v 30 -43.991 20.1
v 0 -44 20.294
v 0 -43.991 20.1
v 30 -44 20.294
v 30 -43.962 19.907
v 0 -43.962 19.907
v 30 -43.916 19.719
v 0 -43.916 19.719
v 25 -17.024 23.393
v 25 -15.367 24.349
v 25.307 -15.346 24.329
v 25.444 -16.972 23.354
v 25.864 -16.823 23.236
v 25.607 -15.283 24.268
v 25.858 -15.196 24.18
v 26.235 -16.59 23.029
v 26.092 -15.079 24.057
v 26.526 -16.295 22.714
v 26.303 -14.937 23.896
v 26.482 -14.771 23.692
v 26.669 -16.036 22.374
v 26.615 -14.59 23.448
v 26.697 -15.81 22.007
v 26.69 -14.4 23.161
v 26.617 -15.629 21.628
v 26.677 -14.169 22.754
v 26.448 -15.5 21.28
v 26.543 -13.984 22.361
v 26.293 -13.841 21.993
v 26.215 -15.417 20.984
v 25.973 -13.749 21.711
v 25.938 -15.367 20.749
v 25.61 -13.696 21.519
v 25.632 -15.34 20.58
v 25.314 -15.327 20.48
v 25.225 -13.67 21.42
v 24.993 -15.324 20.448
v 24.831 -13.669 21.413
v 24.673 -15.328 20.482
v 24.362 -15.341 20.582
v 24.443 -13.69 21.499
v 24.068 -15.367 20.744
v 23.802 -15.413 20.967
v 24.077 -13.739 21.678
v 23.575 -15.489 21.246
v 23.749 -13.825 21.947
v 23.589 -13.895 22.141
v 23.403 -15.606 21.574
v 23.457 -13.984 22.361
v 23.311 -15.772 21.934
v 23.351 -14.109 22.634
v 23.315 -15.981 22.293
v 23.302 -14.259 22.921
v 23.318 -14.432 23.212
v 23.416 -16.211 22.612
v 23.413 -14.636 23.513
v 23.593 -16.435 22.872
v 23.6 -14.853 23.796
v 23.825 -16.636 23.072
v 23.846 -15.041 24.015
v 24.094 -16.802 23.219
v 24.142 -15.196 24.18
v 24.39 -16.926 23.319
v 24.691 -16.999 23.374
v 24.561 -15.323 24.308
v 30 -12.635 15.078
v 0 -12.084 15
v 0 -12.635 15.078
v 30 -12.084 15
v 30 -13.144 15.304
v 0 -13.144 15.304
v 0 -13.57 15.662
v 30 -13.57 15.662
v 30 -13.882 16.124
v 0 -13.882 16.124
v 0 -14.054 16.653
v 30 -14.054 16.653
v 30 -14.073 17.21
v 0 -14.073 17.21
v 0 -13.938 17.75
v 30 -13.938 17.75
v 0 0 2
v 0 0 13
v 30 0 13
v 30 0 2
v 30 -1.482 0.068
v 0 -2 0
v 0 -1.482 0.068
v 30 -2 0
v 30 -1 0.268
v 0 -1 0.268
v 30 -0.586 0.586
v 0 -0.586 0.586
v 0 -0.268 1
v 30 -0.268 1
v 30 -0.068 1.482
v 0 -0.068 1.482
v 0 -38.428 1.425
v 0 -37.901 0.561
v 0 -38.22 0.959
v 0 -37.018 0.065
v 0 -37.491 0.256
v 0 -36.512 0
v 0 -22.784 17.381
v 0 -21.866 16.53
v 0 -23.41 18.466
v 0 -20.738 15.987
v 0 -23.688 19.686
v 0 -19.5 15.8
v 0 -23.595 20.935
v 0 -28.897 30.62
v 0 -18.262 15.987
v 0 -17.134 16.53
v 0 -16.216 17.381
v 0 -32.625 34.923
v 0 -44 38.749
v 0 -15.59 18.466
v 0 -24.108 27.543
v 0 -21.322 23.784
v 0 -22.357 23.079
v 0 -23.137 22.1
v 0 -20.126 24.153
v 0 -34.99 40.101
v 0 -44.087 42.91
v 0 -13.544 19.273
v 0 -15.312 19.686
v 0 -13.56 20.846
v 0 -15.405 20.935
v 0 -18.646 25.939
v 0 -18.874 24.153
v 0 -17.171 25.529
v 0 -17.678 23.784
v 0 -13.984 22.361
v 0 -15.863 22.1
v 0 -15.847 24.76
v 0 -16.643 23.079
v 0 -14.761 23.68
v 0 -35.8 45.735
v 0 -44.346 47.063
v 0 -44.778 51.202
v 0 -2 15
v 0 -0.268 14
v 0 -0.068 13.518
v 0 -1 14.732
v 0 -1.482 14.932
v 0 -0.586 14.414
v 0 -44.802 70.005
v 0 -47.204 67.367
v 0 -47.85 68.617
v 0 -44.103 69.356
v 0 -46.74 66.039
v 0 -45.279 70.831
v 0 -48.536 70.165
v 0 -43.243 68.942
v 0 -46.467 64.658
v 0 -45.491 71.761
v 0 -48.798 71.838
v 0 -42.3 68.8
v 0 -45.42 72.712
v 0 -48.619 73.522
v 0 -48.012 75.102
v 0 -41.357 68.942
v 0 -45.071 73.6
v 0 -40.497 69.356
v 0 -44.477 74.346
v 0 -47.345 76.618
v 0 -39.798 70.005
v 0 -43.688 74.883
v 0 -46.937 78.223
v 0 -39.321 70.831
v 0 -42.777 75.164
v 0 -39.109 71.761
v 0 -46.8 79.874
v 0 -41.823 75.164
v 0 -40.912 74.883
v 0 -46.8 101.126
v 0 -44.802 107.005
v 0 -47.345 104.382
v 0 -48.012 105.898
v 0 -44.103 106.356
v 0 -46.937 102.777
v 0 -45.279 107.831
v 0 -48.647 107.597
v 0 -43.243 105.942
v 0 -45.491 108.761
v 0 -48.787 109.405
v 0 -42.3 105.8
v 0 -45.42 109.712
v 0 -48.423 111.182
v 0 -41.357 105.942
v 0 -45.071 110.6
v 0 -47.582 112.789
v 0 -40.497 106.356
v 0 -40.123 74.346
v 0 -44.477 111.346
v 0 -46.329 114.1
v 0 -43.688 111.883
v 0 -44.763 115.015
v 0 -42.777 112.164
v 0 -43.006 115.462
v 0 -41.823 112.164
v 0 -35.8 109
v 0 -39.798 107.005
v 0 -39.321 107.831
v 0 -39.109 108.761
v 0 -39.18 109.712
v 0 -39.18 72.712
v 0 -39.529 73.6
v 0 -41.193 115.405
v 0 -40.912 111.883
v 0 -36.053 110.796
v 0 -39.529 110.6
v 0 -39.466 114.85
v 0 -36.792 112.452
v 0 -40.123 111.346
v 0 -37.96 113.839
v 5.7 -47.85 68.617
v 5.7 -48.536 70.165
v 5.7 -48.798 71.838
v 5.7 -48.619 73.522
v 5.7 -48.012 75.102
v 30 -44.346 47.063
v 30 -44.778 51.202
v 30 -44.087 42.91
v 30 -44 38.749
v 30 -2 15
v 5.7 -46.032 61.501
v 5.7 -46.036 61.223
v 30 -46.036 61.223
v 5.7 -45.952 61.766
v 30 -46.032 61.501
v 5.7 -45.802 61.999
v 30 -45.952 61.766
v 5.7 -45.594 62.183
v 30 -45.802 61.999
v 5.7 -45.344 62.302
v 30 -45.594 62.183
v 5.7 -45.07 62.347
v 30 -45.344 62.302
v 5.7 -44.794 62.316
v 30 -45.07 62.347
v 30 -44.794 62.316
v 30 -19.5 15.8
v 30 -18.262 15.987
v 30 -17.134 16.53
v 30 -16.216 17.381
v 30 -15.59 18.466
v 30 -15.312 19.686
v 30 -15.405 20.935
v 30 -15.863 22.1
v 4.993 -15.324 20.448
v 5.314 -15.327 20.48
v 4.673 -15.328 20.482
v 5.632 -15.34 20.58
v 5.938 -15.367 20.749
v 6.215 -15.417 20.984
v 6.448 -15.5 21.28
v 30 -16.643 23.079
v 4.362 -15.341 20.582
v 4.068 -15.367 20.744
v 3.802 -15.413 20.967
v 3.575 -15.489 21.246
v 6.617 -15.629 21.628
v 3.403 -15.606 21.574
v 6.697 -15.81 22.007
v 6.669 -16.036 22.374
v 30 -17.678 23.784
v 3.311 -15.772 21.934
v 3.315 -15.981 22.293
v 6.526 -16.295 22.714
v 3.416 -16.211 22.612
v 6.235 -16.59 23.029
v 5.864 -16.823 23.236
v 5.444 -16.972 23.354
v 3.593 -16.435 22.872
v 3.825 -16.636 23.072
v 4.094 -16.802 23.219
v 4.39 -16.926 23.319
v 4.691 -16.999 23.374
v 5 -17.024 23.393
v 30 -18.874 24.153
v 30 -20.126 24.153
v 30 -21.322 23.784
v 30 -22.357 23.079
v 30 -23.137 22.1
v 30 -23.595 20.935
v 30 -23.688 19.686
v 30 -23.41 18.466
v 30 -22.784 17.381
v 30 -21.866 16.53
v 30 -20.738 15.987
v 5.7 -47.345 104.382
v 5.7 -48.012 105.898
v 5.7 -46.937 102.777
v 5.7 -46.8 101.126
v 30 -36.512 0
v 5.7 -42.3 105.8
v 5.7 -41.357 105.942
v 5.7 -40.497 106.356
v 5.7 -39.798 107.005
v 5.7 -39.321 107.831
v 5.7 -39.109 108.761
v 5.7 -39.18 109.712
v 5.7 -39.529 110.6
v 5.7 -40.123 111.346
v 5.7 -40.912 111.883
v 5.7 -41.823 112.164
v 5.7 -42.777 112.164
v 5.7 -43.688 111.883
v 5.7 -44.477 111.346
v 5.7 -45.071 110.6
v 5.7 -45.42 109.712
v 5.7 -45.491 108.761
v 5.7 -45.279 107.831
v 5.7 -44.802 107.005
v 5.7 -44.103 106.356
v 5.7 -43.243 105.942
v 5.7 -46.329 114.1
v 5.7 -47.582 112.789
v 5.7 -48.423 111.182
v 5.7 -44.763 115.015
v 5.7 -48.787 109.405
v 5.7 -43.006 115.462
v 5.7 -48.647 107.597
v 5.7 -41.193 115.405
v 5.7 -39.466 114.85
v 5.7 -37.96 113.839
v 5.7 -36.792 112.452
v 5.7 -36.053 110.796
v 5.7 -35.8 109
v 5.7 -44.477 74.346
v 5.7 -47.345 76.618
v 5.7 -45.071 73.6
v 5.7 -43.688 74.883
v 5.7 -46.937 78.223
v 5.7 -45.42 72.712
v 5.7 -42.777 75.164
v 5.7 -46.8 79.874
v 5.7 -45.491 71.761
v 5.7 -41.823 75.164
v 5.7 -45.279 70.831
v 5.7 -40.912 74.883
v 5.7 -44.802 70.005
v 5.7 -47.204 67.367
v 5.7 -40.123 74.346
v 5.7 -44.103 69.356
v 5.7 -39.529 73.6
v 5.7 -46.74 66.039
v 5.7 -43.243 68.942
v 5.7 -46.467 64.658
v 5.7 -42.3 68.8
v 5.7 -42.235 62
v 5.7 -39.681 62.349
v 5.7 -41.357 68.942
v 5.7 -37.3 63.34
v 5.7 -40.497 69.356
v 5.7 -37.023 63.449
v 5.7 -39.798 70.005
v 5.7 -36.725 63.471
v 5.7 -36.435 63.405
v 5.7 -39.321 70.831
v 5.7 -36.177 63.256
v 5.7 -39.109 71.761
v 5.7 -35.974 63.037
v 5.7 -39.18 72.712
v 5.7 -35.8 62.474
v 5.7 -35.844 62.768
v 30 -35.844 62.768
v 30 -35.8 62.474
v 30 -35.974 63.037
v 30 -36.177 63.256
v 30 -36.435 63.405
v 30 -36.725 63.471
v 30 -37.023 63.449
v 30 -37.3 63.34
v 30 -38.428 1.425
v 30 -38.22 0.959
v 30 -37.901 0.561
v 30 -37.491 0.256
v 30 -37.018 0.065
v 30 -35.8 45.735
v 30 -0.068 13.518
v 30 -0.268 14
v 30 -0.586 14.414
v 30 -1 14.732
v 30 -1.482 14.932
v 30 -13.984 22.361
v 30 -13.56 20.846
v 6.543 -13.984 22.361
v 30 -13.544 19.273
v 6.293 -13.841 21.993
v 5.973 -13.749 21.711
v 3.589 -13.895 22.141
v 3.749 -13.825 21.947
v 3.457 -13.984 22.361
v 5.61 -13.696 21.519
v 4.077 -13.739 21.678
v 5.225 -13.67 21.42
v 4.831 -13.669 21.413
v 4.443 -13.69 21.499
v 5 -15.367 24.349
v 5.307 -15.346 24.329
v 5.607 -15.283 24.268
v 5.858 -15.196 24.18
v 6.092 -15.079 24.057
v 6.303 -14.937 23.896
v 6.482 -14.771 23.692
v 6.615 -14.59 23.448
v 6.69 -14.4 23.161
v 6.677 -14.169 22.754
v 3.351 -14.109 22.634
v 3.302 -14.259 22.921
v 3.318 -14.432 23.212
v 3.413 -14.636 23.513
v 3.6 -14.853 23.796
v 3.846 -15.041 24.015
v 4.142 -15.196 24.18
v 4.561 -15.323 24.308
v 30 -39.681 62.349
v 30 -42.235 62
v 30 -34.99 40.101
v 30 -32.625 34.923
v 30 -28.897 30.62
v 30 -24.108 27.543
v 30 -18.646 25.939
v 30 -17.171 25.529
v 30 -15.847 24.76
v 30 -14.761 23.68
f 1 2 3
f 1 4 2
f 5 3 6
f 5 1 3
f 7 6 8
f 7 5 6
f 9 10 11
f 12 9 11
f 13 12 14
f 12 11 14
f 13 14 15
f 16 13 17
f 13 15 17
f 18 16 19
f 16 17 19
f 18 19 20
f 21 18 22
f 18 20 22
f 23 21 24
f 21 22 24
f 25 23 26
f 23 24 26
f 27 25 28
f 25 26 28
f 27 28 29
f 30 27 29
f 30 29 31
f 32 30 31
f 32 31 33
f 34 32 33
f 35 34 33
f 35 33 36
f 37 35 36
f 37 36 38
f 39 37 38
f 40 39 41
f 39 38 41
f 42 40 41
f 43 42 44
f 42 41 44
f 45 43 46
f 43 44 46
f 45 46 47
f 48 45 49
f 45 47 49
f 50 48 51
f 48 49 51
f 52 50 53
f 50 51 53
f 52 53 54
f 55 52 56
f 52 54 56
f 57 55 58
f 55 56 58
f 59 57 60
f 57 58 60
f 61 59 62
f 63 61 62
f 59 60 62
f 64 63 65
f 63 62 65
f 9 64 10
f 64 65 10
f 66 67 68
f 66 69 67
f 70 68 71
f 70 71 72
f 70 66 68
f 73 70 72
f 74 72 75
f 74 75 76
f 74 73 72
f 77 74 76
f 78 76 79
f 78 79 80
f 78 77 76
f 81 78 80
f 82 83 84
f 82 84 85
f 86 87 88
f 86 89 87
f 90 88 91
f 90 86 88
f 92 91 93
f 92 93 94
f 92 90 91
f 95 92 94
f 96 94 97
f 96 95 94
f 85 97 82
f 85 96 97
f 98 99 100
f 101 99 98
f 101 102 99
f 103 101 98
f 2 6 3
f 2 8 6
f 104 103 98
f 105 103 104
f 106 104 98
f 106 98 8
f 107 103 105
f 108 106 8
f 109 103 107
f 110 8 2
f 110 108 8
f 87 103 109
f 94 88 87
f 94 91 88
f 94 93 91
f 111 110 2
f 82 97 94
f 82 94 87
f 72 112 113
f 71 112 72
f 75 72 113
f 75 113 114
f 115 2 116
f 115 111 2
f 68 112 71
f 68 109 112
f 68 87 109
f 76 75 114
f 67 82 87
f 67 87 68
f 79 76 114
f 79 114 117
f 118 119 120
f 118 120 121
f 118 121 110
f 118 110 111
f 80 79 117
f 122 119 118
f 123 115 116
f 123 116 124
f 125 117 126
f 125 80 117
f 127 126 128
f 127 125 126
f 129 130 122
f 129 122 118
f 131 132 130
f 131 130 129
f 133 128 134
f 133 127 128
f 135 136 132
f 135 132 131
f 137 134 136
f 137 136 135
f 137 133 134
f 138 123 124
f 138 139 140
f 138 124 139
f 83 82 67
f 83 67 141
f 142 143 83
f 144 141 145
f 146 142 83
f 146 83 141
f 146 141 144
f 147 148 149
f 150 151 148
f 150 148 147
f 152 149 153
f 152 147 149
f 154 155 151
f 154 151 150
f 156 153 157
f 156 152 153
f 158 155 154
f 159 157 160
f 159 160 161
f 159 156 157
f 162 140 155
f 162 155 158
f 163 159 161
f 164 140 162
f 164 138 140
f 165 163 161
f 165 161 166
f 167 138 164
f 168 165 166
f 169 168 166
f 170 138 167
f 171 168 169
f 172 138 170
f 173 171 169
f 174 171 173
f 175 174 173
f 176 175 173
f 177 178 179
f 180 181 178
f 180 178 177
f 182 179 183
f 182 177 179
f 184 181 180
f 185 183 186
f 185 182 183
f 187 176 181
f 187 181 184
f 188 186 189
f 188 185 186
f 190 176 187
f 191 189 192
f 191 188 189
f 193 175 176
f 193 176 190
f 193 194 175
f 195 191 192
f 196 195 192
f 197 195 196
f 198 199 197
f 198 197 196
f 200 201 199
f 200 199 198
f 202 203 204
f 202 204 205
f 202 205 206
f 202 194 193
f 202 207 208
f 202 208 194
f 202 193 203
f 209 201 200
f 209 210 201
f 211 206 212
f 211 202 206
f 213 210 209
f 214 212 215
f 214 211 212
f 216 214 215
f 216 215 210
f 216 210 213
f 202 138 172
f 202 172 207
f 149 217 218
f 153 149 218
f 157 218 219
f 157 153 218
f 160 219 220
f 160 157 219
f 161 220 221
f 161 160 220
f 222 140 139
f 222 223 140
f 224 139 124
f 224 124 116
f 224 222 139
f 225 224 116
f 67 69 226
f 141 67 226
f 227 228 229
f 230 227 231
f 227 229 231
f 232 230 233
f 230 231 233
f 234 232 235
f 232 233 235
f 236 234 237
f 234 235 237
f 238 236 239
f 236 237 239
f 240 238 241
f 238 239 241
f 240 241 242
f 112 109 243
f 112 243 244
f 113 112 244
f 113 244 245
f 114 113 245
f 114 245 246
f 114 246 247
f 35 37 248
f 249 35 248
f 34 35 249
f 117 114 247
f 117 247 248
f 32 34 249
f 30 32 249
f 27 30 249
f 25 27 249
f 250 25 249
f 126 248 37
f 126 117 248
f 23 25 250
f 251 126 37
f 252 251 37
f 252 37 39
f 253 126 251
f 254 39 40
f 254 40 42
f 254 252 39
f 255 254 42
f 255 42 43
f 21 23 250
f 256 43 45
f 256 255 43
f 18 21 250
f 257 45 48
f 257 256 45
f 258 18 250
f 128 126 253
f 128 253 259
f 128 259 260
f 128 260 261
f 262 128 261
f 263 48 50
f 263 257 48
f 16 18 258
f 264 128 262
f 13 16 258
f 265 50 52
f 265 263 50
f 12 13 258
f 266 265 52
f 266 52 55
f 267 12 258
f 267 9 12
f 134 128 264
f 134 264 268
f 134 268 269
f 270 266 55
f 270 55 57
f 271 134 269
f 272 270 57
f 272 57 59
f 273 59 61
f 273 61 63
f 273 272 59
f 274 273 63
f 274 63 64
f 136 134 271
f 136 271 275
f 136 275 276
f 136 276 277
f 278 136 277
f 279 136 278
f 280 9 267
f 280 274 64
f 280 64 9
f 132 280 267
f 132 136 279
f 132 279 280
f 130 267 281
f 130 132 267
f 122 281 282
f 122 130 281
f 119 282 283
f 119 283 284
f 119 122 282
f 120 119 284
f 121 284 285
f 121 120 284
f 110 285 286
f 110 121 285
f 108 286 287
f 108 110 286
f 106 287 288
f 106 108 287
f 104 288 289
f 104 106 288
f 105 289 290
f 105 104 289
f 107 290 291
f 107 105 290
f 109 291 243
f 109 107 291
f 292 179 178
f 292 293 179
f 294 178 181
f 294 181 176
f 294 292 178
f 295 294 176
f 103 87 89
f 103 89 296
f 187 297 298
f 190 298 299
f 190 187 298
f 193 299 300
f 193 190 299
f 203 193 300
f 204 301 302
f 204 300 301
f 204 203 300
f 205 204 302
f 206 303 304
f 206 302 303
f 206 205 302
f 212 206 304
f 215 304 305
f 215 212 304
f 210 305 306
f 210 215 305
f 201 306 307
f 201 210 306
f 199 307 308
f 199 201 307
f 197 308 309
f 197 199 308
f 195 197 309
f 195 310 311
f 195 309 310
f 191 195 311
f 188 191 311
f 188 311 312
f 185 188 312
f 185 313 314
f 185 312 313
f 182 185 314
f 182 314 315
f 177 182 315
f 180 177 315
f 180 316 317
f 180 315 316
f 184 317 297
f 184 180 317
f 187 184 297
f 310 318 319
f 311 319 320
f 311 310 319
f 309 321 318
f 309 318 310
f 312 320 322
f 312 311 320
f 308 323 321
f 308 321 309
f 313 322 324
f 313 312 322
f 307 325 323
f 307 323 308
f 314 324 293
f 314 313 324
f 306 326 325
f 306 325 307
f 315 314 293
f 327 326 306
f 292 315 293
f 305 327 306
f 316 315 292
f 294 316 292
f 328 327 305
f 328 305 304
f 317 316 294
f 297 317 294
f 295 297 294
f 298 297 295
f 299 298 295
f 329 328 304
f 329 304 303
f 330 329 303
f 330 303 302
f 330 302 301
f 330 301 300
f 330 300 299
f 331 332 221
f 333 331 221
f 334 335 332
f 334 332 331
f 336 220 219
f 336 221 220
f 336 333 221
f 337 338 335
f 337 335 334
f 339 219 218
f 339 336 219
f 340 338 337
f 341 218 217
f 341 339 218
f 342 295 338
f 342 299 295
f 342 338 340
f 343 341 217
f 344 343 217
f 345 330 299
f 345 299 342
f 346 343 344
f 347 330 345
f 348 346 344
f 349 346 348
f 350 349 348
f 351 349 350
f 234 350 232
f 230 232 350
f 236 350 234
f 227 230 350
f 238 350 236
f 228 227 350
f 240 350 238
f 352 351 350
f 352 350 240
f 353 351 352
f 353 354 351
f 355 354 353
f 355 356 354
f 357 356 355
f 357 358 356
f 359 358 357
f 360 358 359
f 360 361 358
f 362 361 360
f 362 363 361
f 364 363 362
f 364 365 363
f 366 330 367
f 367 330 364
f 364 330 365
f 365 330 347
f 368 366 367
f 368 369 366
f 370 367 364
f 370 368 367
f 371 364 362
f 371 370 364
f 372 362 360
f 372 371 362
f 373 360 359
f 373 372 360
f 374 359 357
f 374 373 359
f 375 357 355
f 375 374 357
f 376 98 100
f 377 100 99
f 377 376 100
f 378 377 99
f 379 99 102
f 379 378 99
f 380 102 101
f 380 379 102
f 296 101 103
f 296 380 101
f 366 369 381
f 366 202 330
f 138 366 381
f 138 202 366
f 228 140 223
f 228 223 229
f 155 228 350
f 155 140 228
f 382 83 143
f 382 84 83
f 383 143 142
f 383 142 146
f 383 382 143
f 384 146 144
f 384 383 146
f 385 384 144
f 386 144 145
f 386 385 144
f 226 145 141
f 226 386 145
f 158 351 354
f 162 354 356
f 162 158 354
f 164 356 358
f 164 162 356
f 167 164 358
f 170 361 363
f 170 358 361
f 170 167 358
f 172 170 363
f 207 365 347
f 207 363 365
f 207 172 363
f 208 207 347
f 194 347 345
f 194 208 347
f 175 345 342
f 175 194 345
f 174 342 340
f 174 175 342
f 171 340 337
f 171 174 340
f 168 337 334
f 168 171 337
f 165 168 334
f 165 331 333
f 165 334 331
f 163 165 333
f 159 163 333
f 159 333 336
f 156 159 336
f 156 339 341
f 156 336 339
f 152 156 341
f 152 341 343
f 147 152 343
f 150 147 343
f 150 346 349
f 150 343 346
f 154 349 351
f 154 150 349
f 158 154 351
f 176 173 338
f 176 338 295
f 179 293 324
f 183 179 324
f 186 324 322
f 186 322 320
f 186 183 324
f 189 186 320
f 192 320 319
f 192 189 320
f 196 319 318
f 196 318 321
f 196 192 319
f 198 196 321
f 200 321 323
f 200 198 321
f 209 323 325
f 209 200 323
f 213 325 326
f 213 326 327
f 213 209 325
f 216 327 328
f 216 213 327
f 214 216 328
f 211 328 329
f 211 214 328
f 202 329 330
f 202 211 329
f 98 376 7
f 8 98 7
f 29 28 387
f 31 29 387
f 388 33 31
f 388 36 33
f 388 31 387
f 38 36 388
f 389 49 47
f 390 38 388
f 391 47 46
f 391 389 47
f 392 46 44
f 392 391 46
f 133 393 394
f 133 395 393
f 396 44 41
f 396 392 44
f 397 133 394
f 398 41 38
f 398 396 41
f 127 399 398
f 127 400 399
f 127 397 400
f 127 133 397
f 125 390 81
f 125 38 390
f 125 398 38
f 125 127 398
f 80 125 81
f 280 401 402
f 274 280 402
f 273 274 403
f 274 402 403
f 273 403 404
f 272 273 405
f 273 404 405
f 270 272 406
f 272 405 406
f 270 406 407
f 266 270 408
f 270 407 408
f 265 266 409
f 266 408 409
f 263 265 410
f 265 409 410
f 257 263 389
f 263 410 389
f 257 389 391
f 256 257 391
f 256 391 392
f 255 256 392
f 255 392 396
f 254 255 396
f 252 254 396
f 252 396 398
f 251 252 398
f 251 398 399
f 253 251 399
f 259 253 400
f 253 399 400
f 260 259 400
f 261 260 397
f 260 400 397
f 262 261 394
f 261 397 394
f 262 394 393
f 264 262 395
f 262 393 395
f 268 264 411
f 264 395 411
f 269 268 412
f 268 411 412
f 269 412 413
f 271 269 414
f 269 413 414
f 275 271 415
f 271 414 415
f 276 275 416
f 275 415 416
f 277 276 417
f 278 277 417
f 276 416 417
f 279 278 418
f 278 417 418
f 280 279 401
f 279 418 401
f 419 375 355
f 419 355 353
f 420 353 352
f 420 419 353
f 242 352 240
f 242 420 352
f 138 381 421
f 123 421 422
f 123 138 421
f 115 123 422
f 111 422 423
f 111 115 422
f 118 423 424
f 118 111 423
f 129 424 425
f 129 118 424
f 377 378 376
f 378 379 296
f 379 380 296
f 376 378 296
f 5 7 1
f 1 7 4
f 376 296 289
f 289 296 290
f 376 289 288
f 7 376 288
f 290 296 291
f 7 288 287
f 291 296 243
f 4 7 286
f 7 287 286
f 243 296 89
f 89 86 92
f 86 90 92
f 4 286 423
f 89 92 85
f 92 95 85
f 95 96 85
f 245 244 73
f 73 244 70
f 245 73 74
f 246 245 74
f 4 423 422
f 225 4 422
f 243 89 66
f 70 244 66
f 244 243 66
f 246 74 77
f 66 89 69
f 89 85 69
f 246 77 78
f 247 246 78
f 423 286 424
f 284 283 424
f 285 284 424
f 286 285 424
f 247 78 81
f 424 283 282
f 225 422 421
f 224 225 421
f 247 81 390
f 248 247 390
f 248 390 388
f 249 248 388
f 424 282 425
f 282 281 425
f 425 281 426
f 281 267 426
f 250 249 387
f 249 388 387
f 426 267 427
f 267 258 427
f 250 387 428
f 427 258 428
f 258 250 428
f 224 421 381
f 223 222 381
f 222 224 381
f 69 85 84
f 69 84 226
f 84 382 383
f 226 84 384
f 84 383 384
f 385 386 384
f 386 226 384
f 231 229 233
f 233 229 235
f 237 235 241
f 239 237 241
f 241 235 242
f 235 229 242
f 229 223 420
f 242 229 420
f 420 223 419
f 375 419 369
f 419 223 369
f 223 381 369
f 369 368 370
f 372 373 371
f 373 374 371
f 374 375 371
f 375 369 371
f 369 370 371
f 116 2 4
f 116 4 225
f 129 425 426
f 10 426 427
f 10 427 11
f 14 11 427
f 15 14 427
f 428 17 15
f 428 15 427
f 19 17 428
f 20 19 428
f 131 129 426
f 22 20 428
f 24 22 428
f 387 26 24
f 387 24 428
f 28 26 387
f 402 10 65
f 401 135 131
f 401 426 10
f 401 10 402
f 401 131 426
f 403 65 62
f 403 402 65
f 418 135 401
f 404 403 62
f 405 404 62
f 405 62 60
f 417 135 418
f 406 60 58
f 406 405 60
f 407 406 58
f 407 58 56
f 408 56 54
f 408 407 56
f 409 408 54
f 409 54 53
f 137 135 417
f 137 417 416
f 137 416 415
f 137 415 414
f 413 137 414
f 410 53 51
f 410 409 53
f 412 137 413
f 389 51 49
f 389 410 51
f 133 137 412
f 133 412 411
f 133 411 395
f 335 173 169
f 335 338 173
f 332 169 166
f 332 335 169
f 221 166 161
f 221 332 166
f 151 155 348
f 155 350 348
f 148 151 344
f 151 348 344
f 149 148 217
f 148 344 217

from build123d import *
from build123d.topology import SkipClean

# Parameters (mm, degrees)
SKETCH_1_R               = 4.2
SKETCH_1_R_2             = 3.2
EXTRUDE_1_DEPTH          = 30
CUT_EXTRUDE_1_DEPTH      = 125.586877319
CUT_EXTRUDE_1_DEPTH_BACK = 125.586877319
SKETCH_2_R               = 5
SKETCH_4_R               = 8
CUT_EXTRUDE_3_DEPTH      = 24.3
CUT_EXTRUDE_4_DEPTH      = 24.3
CUT_EXTRUDE_5_REACH      = 105.181
CUT_EXTRUDE_5_END_RADIUS = 4.2
SKETCH_7_R               = 1.7
FILLET_1_R               = 2
FILLET_2_R               = 100
FILLET_4_R               = 2
FILLET_5_R               = 1
FILLET_6_R               = 10


with BuildPart() as part:
    # ｽｹｯﾁ1 → ﾎﾞｽ - 押し出し1 (new body)
    with BuildSketch(Plane(origin=(0, 0, 0), x_dir=(0, 0, -1), z_dir=(1, 0, 0))):
        with BuildLine():
            Line((0, 0), (0, -38))
            Line((0, -38), (-20, -44))
            Line((-20, -44), (-45, -44))
            Line((-45, -44), (-67.30958424, -46.8))
            ThreePointArc((-67.30958424, -46.8), (-72, -48.8), (-76.69041576, -46.8))
            Line((-76.69041576, -46.8), (-104.30958424, -46.8))
            ThreePointArc((-104.30958424, -46.8), (-114.979130372, -44.849509757), (-109, -35.8))
            Line((-109, -35.8), (-73.332546795, -35.8))
            Line((-73.332546795, -35.8), (-72, -35.8))
            Line((-72, -35.8), (-45.735384202, -35.8))
            ThreePointArc((-45.735384202, -35.8), (-32.638114962, -30.91494421), (-25.938934816, -18.646153846))
            ThreePointArc((-25.938934816, -18.646153846), (-24.759789788, -15.847001072), (-22.360864108, -13.983994139))
            ThreePointArc((-22.360864108, -13.983994139), (-18.282275098, -13.751137403), (-15, -16.18337521))
            Line((-15, -16.18337521), (-15, 0))
            Line((-15, 0), (0, 0))
        make_face()
        with Locations((-20, -19.5)):
            Circle(SKETCH_1_R, mode=Mode.SUBTRACT)
        with Locations((-109, -42.3)):
            Circle(SKETCH_1_R_2, mode=Mode.SUBTRACT)
        with Locations((-72, -42.3)):
            Circle(SKETCH_1_R_2, mode=Mode.SUBTRACT)
    extrude(amount=EXTRUDE_1_DEPTH)

    # ｽｹｯﾁ2 → ｶｯﾄ - 押し出し1 (cut, two sides: drawn at the far end of the back side and taken through both)
    with BuildSketch(Plane(origin=(0, -35.8, 0), x_dir=(1, 0, 0), z_dir=(0, 1, 0)).offset(-CUT_EXTRUDE_1_DEPTH_BACK)):
        with Locations(Location((15, -83.6, 0), (0, 0, 270))):
            Circle(SKETCH_2_R)
    extrude(amount=CUT_EXTRUDE_1_DEPTH + CUT_EXTRUDE_1_DEPTH_BACK, mode=Mode.SUBTRACT)

    # ｽｹｯﾁ4 → ｶｯﾄ - 押し出し3 (cut)
    with BuildSketch(Plane(origin=(30, 0, 0), x_dir=(0, 0, -1), z_dir=(1, 0, 0))):
        with Locations((-72, -42.3)):
            Circle(SKETCH_4_R)
        with Locations((-109, -42.3)):
            Circle(SKETCH_4_R)
    extrude(amount=-CUT_EXTRUDE_3_DEPTH, mode=Mode.SUBTRACT)

    # ｽｹｯﾁ5 → ｶｯﾄ - 押し出し4 (cut)
    with BuildSketch(Plane(origin=(30, 0, 0), x_dir=(0, 0, -1), z_dir=(1, 0, 0))):
        with BuildLine():
            Line((-109, -32.3), (-72, -32.3))
            ThreePointArc((-72, -32.3), (-62, -42.3), (-72, -52.3))
            Line((-72, -52.3), (-109, -52.3))
            ThreePointArc((-109, -52.3), (-119, -42.3), (-109, -32.3))
        make_face()
    extrude(amount=-CUT_EXTRUDE_4_DEPTH, mode=Mode.SUBTRACT)

    # ｶｯﾄ - 押し出し5: up to this cylinder (the profile starts outside it)
    with SkipClean():  # the faces are left unmerged after this step: merging them gives an invalid solid
        cut_extrude_5_end = Plane(origin=(15, -19.5, 20), z_dir=(-1, 0, 0)) * Cylinder(CUT_EXTRUDE_5_END_RADIUS, 239.762, mode=Mode.PRIVATE)
        # ｽｹｯﾁ7 → ｶｯﾄ - 押し出し5 (cut, up to the surface)
        with BuildSketch(Plane(origin=(30, -14.303847577, 23), x_dir=(1, 0, 0), z_dir=(0, 0.866025403784436, 0.5000000000000043)), mode=Mode.PRIVATE) as cut_extrude_5_sk1:
            with Locations(Location((-5, 0, 0), (0, 0, 270))):
                Circle(SKETCH_7_R)
        cut_extrude_5_tool1 = extrude(cut_extrude_5_sk1.sketch, amount=-CUT_EXTRUDE_5_REACH, mode=Mode.PRIVATE) - cut_extrude_5_end
        add(cut_extrude_5_tool1.solids().sort_by_distance((25, -14.303848, 23))[0], mode=Mode.SUBTRACT)
        # ｽｹｯﾁ7 → ｶｯﾄ - 押し出し5 (cut, up to the surface)
        with BuildSketch(Plane(origin=(30, -14.303847577, 23), x_dir=(1, 0, 0), z_dir=(0, 0.866025403784436, 0.5000000000000043)), mode=Mode.PRIVATE) as cut_extrude_5_sk2:
            with Locations(Location((-25, 0, 0), (0, 0, 270))):
                Circle(SKETCH_7_R)
        cut_extrude_5_tool2 = extrude(cut_extrude_5_sk2.sketch, amount=-CUT_EXTRUDE_5_REACH, mode=Mode.PRIVATE) - cut_extrude_5_end
        add(cut_extrude_5_tool2.solids().sort_by_distance((5, -14.303848, 23))[0], mode=Mode.SUBTRACT)

    # ﾌｨﾚｯﾄ1
    fillet_1_edges = [part.edges().sort_by_distance(p)[0] for p in [
        (15, -16.18337521, 15),
    ]]
    fillet(fillet_1_edges, radius=FILLET_1_R)

    # ﾌｨﾚｯﾄ2
    fillet_2_edges = [part.edges().sort_by_distance(p)[0] for p in [
        (15, -44, 45),
    ]]
    fillet(fillet_2_edges, radius=FILLET_2_R)

    # ﾌｨﾚｯﾄ4
    fillet_4_edges = [part.edges().sort_by_distance(p)[0] for p in [
        (15, 0, 0),
        (15, -38, 0),
        (15, -44, 20),
        (15, 0, 15),
    ]]
    fillet(fillet_4_edges, radius=FILLET_4_R)

    # ﾌｨﾚｯﾄ5
    fillet_5_edges = [part.edges().sort_by_distance(p)[0] for p in [
        (17.85, -46.23485742, 62.80669281),
        (17.85, -35.8, 64.400657923),
    ]]
    fillet(fillet_5_edges, radius=FILLET_5_R)

    # ﾌｨﾚｯﾄ6
    fillet_6_edges = [part.edges().sort_by_distance(p)[0] for p in [
        (2.85, -46.8, 67.30958424),
        (2.85, -46.8, 76.69041576),
        (2.85, -46.8, 104.30958424),
    ]]
    fillet(fillet_6_edges, radius=FILLET_6_R)


solid = part.part
